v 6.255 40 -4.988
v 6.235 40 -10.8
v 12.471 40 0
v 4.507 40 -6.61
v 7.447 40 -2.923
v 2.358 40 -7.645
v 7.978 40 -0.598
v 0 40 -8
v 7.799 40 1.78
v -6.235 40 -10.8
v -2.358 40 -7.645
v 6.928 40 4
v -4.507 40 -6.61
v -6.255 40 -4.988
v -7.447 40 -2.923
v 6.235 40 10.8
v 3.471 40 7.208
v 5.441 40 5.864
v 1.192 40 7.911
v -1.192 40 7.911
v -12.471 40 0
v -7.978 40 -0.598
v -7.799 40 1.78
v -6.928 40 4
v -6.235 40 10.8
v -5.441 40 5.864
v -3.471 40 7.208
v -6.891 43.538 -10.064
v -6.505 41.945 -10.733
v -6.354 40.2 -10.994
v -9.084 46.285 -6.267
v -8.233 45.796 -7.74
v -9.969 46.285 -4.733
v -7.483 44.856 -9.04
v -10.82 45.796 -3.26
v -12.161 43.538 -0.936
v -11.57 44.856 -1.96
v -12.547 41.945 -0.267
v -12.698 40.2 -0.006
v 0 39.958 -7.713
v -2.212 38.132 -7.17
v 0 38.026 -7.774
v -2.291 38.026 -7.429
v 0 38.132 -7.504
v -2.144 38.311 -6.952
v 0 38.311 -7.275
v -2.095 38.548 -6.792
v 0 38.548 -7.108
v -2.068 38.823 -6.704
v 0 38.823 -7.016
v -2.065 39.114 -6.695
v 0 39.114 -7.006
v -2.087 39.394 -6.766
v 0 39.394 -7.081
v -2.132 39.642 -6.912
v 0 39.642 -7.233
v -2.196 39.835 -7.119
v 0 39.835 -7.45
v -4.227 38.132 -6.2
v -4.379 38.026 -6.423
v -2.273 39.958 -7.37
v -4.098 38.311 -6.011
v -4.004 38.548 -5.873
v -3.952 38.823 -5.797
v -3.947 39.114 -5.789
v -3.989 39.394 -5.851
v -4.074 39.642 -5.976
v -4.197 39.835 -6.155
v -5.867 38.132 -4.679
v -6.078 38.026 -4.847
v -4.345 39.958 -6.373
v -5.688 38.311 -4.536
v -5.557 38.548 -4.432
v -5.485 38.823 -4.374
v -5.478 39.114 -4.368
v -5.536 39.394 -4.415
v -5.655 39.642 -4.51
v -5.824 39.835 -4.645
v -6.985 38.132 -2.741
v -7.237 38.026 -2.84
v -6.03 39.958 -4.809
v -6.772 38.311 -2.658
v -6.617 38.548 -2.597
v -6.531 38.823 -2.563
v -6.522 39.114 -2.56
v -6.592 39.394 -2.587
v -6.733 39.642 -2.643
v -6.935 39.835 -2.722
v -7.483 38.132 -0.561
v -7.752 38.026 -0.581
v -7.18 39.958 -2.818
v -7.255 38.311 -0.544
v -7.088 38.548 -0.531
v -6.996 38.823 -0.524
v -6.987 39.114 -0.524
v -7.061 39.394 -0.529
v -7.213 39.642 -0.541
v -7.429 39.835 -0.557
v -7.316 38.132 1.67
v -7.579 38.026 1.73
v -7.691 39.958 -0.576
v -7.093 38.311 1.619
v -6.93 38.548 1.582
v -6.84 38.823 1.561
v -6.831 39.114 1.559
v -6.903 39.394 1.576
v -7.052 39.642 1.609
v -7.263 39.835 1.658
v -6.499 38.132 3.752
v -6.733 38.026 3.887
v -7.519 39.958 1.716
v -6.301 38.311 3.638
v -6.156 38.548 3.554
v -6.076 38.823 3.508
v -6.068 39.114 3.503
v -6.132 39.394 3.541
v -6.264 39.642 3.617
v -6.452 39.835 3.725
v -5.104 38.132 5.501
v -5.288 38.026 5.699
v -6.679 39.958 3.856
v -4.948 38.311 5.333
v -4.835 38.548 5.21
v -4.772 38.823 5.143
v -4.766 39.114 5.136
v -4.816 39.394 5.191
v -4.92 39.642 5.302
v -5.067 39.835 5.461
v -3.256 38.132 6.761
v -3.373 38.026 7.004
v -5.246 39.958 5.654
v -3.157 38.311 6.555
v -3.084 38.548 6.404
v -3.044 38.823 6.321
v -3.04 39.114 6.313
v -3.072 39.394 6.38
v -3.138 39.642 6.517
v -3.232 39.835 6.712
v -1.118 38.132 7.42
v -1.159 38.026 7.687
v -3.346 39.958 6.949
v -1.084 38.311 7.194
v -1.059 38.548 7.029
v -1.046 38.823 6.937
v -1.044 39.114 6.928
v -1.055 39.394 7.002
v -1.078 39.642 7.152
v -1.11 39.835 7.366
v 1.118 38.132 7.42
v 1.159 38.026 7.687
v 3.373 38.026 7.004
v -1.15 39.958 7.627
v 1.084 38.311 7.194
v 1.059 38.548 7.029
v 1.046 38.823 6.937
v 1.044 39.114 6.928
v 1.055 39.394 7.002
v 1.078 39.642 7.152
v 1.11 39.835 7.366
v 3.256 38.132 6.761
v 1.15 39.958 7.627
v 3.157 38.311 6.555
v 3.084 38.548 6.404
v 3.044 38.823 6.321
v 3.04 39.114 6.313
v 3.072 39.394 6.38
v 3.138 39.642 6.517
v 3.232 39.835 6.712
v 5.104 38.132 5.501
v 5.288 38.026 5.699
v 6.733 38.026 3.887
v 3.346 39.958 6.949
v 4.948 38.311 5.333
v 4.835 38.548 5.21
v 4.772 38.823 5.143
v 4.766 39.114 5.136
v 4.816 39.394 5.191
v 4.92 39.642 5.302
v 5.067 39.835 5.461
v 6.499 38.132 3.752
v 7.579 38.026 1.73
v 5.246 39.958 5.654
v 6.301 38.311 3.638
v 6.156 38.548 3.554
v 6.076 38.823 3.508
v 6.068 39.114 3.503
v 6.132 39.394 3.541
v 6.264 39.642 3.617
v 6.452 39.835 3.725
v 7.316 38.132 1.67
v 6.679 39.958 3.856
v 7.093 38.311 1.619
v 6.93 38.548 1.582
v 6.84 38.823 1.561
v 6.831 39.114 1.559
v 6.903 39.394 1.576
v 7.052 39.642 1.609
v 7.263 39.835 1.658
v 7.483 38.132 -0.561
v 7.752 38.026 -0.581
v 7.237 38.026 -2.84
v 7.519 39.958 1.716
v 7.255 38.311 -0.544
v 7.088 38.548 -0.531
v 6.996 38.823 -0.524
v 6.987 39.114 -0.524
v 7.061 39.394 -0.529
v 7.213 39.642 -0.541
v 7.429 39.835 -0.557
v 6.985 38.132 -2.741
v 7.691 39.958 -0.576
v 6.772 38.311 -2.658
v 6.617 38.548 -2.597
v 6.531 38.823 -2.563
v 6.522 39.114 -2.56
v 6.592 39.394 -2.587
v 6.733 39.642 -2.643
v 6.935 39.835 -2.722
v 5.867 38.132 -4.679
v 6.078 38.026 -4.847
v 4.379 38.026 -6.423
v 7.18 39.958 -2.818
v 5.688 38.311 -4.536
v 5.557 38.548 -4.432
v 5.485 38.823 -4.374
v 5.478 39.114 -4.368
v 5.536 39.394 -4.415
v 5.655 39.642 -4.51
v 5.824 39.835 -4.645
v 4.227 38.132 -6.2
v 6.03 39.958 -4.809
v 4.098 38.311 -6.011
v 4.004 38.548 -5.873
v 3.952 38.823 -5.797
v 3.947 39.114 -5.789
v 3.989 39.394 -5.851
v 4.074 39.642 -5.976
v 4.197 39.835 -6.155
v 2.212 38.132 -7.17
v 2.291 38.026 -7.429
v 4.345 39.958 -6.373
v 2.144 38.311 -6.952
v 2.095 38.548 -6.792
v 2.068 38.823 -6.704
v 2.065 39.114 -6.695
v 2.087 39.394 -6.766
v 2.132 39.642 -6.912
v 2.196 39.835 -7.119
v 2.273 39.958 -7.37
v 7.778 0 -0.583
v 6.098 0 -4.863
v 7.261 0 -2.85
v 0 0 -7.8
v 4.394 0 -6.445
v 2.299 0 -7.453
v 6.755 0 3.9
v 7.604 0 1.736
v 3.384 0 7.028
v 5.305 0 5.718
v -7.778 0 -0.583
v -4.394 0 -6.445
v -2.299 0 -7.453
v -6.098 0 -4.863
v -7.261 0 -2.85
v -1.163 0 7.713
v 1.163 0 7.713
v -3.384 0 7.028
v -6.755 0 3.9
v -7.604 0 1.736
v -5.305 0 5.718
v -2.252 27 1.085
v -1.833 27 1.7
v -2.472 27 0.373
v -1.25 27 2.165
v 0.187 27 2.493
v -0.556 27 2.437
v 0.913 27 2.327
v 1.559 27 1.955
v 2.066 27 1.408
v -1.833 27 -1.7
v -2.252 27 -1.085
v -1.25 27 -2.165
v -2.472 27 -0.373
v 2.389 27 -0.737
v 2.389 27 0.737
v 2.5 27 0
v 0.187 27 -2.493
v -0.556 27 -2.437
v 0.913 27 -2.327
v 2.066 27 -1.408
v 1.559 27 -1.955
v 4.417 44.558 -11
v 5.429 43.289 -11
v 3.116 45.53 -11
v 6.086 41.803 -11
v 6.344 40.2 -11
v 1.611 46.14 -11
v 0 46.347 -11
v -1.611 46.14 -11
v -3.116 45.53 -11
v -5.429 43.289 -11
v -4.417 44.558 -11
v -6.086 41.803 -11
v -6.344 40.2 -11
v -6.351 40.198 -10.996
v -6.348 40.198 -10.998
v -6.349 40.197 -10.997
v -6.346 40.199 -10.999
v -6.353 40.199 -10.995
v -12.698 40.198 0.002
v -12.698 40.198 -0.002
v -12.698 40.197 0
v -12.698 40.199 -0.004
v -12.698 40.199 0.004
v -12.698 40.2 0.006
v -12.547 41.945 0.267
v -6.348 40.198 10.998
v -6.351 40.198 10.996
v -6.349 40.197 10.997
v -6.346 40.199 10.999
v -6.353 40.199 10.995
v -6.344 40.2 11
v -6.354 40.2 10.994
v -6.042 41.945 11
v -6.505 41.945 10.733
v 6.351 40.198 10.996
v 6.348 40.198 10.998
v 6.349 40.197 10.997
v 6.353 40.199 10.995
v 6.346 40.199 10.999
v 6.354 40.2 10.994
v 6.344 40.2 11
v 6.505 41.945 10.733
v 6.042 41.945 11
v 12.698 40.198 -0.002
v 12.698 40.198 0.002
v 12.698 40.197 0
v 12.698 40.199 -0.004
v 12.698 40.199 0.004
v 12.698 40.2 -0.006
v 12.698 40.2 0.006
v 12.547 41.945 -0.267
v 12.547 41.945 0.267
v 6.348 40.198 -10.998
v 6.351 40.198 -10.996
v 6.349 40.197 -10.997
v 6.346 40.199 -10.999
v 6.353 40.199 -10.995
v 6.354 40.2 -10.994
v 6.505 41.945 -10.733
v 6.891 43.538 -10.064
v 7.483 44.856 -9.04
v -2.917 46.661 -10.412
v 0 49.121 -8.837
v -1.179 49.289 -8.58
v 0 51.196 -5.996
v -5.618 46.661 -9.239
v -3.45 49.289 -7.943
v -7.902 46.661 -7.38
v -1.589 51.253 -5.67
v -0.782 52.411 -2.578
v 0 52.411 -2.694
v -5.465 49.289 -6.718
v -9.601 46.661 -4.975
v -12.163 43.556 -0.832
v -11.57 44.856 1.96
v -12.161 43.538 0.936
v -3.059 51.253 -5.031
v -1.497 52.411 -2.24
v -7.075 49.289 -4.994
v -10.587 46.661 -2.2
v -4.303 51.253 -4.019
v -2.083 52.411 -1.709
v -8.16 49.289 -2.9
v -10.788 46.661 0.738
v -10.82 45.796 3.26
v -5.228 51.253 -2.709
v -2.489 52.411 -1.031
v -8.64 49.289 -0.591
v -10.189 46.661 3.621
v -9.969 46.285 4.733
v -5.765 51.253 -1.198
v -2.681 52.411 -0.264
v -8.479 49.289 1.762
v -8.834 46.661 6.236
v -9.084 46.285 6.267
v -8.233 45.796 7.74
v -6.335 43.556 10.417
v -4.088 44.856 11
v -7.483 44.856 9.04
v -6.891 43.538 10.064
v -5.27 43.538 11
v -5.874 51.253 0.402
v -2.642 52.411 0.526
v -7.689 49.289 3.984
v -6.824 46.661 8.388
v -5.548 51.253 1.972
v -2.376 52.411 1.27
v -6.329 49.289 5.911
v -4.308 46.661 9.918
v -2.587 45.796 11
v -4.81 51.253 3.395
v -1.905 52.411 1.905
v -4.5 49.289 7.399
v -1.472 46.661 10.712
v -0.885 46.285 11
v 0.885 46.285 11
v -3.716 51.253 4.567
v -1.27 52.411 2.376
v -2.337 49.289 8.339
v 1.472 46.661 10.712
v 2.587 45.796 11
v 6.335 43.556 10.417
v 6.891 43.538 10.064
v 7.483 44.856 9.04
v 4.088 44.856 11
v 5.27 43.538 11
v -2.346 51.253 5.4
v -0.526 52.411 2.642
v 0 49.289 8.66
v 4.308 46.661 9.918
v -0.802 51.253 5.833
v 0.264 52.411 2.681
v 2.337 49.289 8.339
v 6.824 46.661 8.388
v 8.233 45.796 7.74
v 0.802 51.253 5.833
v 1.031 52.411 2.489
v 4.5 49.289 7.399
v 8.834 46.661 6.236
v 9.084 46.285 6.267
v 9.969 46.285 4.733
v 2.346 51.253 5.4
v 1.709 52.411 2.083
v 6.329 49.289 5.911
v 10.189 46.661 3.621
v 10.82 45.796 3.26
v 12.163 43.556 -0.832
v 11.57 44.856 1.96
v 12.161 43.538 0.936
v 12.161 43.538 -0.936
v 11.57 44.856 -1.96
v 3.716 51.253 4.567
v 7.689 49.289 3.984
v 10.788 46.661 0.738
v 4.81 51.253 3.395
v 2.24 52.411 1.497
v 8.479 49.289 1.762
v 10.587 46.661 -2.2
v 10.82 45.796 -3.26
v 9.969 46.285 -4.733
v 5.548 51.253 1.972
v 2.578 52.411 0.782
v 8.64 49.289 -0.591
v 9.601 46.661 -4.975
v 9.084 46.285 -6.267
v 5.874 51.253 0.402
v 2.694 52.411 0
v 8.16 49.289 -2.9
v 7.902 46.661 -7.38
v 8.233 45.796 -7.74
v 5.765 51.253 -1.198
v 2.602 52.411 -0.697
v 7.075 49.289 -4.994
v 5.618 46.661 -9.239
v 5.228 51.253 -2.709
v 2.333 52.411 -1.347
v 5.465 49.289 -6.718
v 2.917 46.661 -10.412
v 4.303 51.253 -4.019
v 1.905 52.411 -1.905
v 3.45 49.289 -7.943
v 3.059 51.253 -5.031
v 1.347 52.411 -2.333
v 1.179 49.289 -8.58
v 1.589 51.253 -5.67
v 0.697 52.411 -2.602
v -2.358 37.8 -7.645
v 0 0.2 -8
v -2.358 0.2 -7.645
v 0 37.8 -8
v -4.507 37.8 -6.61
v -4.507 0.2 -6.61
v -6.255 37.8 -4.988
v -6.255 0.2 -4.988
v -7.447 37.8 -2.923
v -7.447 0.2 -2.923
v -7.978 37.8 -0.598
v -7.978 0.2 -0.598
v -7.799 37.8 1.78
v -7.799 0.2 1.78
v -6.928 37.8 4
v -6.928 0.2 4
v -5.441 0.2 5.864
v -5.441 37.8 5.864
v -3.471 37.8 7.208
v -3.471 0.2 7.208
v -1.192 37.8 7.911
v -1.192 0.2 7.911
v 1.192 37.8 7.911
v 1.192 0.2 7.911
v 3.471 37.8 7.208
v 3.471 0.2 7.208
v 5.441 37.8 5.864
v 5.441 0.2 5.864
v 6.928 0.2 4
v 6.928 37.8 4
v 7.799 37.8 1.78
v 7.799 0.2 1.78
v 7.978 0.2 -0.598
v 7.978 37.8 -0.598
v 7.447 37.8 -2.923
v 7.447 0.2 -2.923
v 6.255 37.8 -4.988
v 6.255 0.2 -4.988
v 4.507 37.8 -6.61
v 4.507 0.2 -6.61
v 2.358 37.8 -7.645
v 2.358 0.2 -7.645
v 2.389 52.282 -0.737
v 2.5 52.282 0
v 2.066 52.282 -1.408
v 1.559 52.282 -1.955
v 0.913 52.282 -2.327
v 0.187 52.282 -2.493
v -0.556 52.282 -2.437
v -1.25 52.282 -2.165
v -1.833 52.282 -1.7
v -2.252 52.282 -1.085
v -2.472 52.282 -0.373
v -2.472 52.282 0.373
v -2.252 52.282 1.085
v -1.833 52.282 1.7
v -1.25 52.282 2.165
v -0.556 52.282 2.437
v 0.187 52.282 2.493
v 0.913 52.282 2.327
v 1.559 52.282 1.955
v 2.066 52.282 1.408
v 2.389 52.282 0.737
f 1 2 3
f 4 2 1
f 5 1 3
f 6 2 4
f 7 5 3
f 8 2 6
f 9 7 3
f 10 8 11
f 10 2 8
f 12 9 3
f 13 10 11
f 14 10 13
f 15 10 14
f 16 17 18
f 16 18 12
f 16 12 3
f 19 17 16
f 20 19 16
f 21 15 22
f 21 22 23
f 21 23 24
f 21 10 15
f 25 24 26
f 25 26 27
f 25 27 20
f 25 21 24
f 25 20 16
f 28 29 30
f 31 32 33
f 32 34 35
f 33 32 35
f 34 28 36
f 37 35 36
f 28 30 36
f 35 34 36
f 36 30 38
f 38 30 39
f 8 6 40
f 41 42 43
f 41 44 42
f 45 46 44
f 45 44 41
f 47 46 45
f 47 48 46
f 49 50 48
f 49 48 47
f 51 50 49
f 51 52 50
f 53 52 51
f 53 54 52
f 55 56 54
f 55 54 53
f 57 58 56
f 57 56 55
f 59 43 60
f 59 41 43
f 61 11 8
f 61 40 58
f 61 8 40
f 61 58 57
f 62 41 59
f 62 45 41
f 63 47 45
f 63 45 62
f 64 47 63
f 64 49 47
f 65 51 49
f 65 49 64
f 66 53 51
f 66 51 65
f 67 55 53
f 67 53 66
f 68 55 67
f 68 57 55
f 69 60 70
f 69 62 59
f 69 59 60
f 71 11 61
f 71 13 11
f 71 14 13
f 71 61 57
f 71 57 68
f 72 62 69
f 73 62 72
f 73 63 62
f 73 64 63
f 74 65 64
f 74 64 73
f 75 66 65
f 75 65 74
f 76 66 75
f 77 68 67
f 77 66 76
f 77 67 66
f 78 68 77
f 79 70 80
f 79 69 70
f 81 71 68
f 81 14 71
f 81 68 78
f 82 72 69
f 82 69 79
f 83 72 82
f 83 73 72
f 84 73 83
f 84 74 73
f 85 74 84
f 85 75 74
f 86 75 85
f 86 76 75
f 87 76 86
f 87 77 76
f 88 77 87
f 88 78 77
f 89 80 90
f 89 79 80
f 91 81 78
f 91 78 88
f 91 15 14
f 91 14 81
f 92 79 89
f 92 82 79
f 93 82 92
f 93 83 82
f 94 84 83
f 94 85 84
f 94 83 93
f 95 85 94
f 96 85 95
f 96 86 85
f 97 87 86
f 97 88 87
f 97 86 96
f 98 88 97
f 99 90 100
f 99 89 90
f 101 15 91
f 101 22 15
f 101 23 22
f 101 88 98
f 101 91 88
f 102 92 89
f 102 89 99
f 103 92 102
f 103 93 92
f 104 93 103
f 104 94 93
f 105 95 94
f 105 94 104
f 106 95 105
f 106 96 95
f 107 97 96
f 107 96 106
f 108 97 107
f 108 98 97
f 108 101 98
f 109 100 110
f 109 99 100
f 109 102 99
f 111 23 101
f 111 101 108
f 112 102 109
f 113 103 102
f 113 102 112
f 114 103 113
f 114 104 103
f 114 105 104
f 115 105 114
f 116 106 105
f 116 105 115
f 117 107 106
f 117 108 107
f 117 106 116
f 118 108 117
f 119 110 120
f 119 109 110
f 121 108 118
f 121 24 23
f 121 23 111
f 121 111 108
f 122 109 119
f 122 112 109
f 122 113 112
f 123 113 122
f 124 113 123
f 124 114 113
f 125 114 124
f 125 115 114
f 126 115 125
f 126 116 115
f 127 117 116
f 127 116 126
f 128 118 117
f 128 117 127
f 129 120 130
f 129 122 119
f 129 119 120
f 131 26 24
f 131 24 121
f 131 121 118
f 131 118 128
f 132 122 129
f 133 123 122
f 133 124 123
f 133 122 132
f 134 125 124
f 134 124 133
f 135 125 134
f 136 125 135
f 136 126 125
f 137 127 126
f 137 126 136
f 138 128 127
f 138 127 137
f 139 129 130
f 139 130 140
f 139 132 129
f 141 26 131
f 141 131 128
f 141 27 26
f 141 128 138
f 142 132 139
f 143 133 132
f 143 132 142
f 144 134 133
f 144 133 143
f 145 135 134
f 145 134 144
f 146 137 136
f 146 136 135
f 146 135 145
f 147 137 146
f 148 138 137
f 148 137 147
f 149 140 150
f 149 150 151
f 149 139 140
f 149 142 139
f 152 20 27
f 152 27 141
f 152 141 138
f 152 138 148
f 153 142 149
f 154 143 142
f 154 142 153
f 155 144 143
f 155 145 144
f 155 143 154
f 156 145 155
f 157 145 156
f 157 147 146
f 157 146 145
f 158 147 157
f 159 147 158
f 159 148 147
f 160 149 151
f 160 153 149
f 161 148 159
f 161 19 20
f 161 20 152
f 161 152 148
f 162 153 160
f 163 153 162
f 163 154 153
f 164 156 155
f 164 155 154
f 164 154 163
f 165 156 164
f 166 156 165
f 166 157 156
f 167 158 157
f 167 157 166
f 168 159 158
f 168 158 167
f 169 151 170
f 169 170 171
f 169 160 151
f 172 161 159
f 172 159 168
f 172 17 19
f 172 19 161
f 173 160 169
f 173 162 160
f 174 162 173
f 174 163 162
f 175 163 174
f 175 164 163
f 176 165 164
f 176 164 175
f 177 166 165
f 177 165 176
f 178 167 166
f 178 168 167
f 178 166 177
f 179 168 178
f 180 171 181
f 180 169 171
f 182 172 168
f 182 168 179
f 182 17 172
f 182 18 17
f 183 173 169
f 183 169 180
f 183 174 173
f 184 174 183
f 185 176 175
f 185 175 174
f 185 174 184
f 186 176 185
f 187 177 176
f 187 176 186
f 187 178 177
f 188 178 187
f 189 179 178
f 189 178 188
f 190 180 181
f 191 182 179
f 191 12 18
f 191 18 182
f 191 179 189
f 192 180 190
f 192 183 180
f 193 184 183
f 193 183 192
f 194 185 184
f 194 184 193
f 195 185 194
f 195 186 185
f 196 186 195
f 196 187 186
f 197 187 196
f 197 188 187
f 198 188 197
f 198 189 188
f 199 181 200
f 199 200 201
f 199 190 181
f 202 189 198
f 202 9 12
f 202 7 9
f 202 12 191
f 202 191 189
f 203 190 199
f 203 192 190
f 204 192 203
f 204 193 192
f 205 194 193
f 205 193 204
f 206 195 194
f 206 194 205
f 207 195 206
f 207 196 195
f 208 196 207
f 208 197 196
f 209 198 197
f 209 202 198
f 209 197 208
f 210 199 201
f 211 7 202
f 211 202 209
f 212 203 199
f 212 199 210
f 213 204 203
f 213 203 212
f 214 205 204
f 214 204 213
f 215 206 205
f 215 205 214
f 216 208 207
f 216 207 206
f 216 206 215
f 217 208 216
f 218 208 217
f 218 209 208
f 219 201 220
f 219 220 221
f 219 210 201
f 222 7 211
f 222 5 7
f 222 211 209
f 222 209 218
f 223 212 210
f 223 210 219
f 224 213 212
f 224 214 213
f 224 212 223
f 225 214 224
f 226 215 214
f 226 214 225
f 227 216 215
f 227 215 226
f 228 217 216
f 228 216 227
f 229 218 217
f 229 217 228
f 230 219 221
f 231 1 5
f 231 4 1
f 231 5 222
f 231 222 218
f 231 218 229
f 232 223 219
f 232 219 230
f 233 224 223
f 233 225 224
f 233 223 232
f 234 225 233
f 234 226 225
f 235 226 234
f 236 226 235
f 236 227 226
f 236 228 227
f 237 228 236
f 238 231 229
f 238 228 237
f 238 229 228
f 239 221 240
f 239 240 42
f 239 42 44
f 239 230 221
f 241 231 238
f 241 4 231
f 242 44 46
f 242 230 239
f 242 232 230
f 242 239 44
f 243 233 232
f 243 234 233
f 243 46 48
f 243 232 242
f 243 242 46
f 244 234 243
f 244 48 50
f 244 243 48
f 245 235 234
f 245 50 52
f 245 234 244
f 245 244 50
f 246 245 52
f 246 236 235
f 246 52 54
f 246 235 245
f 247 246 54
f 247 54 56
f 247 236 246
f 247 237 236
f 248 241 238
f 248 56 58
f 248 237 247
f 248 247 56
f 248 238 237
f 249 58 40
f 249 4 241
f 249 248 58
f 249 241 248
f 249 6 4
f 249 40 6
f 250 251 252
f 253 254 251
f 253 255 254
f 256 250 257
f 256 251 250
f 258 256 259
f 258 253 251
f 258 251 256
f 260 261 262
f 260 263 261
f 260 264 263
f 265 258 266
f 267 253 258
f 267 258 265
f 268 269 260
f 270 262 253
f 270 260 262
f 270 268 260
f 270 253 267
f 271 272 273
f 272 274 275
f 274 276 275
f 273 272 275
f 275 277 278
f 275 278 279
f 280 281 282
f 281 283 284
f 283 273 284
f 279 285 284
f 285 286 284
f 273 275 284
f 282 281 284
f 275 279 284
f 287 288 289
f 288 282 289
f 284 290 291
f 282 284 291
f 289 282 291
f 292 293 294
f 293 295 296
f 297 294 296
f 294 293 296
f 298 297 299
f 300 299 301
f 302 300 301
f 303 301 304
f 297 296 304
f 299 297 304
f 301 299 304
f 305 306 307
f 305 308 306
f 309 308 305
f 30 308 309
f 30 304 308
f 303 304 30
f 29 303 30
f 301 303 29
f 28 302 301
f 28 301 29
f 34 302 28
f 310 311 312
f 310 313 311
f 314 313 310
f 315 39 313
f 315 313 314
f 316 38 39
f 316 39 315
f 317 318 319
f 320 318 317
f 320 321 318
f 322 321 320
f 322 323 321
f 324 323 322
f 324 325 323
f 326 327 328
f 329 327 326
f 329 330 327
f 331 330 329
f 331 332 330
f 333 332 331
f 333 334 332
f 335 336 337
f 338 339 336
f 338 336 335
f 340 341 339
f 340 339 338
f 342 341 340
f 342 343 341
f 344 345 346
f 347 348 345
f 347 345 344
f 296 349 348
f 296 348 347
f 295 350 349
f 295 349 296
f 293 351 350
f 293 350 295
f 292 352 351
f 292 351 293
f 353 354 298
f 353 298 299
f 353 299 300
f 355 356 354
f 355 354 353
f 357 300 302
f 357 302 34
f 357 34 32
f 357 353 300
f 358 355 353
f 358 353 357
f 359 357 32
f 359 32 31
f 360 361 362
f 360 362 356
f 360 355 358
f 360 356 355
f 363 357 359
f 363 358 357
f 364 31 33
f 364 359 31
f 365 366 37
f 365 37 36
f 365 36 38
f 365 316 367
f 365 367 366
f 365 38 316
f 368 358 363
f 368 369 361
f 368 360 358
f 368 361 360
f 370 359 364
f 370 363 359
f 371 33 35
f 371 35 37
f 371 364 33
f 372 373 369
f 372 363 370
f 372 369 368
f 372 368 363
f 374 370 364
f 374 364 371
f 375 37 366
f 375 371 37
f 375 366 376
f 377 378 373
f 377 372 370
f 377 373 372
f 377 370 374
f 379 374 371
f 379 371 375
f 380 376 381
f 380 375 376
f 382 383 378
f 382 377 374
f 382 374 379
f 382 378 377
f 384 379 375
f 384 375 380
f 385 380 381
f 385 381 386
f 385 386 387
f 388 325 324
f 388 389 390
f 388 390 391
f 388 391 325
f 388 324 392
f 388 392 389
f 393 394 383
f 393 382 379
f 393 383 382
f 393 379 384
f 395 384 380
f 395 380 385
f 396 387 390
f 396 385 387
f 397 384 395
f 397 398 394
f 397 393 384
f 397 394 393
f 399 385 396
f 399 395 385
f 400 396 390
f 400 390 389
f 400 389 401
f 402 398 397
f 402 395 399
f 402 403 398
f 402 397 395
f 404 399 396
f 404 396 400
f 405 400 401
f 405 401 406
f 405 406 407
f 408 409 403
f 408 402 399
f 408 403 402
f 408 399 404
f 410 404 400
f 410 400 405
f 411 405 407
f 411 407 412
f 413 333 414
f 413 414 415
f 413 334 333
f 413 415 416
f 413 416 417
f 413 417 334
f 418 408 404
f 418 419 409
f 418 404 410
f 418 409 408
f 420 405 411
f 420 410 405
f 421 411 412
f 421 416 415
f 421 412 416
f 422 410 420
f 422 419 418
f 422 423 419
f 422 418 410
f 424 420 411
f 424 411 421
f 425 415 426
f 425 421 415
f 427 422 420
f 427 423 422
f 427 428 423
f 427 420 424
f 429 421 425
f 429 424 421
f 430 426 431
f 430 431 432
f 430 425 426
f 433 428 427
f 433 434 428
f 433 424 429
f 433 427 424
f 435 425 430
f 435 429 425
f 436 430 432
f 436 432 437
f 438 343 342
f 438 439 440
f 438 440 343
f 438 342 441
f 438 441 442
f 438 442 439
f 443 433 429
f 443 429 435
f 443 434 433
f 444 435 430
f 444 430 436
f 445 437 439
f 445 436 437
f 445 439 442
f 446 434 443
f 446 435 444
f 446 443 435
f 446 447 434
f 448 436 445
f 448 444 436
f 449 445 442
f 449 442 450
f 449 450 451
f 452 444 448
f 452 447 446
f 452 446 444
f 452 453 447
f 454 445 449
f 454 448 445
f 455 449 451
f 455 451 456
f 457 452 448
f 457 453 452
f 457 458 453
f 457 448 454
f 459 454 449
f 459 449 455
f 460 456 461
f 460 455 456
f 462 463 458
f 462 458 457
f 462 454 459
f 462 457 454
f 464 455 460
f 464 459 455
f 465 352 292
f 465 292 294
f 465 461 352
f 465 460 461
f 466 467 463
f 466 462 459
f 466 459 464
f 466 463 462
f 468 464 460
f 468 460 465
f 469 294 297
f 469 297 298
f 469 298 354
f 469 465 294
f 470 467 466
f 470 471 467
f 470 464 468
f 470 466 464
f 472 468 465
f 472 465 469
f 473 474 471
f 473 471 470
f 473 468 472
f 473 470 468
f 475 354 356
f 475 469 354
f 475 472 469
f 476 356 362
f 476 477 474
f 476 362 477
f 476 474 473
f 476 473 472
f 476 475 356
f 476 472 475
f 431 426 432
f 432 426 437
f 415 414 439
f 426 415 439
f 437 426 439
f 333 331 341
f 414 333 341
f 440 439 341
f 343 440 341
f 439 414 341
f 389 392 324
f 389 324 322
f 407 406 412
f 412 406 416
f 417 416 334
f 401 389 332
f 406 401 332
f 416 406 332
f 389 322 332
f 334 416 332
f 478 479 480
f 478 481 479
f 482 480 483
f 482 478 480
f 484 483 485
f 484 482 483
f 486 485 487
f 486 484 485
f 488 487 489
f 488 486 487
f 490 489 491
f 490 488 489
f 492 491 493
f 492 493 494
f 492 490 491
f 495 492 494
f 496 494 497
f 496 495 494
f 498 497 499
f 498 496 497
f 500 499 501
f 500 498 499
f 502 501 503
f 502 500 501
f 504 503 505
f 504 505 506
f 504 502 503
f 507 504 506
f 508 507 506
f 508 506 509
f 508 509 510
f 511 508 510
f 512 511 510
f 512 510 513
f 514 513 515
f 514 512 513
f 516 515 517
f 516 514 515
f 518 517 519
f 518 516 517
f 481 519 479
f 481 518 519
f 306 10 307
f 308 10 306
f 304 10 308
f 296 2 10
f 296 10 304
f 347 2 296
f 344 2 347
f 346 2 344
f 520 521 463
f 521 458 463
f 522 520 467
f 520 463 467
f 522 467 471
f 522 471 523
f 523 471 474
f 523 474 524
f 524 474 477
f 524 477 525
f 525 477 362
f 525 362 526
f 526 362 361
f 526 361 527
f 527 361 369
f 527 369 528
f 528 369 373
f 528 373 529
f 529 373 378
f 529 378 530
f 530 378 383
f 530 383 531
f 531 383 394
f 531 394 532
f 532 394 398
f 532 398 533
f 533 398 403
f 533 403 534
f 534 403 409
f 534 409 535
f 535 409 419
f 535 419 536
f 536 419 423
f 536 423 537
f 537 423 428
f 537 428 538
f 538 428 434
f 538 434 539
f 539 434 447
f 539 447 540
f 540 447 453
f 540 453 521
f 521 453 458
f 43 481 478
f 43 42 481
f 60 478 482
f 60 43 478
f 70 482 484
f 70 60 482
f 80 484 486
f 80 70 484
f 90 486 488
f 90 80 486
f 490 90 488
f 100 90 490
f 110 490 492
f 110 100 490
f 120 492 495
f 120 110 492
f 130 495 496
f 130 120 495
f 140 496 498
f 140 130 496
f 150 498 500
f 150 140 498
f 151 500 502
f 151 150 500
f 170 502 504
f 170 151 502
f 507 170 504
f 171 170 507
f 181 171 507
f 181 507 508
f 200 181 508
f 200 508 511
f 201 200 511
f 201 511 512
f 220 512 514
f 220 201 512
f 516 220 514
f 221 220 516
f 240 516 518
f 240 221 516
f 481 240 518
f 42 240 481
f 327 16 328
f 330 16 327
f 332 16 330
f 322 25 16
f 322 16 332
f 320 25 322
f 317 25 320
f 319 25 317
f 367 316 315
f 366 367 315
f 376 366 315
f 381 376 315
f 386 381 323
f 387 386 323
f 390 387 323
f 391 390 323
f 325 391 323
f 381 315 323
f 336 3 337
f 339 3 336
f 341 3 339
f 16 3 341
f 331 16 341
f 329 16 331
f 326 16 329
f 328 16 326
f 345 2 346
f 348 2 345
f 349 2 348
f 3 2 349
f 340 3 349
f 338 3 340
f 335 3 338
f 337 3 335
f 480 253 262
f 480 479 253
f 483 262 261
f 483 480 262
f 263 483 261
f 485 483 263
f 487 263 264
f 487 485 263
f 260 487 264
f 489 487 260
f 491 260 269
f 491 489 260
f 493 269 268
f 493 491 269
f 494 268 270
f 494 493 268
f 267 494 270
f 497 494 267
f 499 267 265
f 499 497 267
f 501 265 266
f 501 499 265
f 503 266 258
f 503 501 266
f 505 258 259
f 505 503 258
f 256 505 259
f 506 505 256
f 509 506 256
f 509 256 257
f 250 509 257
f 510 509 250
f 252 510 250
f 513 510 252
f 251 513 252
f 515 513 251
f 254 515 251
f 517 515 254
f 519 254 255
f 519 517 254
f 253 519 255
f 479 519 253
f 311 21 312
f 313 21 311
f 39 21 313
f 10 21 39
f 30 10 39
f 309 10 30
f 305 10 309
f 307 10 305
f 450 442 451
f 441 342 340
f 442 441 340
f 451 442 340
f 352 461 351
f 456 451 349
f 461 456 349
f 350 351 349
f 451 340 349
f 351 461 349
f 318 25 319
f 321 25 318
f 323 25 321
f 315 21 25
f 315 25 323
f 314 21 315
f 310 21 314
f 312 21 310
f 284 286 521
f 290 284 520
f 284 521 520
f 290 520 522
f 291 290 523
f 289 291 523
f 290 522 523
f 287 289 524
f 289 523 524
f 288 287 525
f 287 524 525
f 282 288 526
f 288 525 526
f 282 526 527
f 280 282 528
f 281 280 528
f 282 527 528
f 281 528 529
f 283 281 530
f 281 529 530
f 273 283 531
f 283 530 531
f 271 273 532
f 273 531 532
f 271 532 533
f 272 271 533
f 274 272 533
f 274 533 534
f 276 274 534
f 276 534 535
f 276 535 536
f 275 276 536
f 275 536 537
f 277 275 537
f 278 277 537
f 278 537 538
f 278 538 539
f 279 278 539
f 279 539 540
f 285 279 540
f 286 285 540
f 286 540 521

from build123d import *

# Parameters (mm, degrees)
SKETCH2_R             = 19.260759025
CUT_EXTRUDE1_DEPTH    = 50
M6X1_0_TAPPED_HOLE1_D = 5
CHAMFER1_SIZE         = 0.2
CHAMFER1_SIZE_2       = 0.169882553
BOSS_EXTRUDE1_START   = -27
SKETCH6_R             = 2.5
BOSS_EXTRUDE1_DEPTH   = 27


with BuildPart() as part:
    # Sketch3 → Revolve1 (revolve)
    with BuildSketch(Plane.XY, mode=Mode.PRIVATE) as revolve1_sk:
        with BuildLine():
            Line((0, 0), (8, 0))
            Line((8, 0), (8, 38))
            ThreePointArc((8, 38), (7, 39), (8, 40))
            Line((8, 40), (12.7, 40))
            ThreePointArc((12.7, 40), (8.980256121, 48.980256121), (0, 52.7))
            Line((0, 52.7), (0, 0))
        make_face()
    revolve(revolve1_sk.sketch.rotate(Axis((0, 0, 0), (0, 1, 0)), 90), axis=Axis((0, 0, 0), (0, 1, 0)))

    # Sketch2 → Cut-Extrude1 (cut)
    with BuildSketch(Plane(origin=(0, 0, 0), x_dir=(1, 0, 0), z_dir=(0, 1, 0))):
        Circle(SKETCH2_R)
        Polygon((-6.350852961, 11), (-12.701705922, 0), (-6.350852961, -11), (6.350852961, -11), (12.701705922, 0), (6.350852961, 11), align=None, mode=Mode.SUBTRACT)
    extrude(amount=CUT_EXTRUDE1_DEPTH, mode=Mode.SUBTRACT)

    # M6x1.0 Tapped Hole1 (through all)
    with Locations(Plane(origin=(0, 0, 0), x_dir=(-1, 0, 0), z_dir=(0, -1, 0))):
        with Locations((0, 0)):
            Hole(M6X1_0_TAPPED_HOLE1_D / 2)

    # Chamfer1
    # the kernel refuses this chamfer: 0.2, 0.169882553 mm, written as the material it takes off along each edge
    with BuildSketch(Plane(origin=(12.957167955, 40, 0.44247322), x_dir=(-0.8660254037844386, 0, 0.5), z_dir=(-0.5000000000000001, 0, -0.8660254037844387)), Plane(origin=(6.095390928, 40, 11.44247322), x_dir=(-0.8660254037844386, 0, -0.5), z_dir=(0.5000000000000001, 0, -0.8660254037844386)), Plane(origin=(-6.861777027, 40, 11), x_dir=(0, 0, -1), z_dir=(1, 0, 0)), Plane(origin=(-12.957167955, 40, -0.44247322), x_dir=(0.8660254037844387, 0, -0.5), z_dir=(0.5, 0, 0.8660254037844387)), Plane(origin=(-6.095390928, 40, -11.44247322), x_dir=(0.8660254037844384, 0, 0.5000000000000002), z_dir=(-0.5000000000000003, 0, 0.8660254037844386)), Plane(origin=(6.861777027, 40, -11), x_dir=(0, 0, 1), z_dir=(-1, 0, 0))) as chamfer1_piece_1:
        Polygon((CHAMFER1_SIZE, 0), (0, CHAMFER1_SIZE), (0, 0), align=None)
    extrude(amount=13.723554053, mode=Mode.SUBTRACT)
    with BuildSketch(Plane(origin=(0, 38, 0), x_dir=(0, 0, -1), z_dir=(1, 0, 0))) as chamfer1_piece_2:
        with BuildLine():
            Line((8, -CHAMFER1_SIZE), (7.774165739, 0.025834261))
            ThreePointArc((7.774165739, 0.025834261), (7.883207603, 0.00684365), (8, 0))
            Line((8, 0), (8, -CHAMFER1_SIZE))
        make_face()
    revolve(axis=Axis((0, 38, 0), (0, 1, 0)), mode=Mode.SUBTRACT)
    with BuildSketch(Plane(origin=(0, 0, 0), x_dir=(0, 0, -1), z_dir=(1, 0, 0))) as chamfer1_piece_3:
        Polygon((8 - CHAMFER1_SIZE, 0), (8, CHAMFER1_SIZE), (8, 0), align=None)
    revolve(axis=Axis((0, 0, 0), (0, 1, 0)), mode=Mode.SUBTRACT)
    with BuildSketch(Plane(origin=(0, 52.451505933, 0), x_dir=(1, 0, 0), z_dir=(0, 0, 1))) as chamfer1_piece_4:
        with BuildLine():
            Line((2.5, -CHAMFER1_SIZE_2), (2.694261242, -0.040585082))
            ThreePointArc((2.694261242, -0.040585082), (2.599956234, -0.020487166), (2.5, 0))
            Line((2.5, 0), (2.5, -CHAMFER1_SIZE_2))
        make_face()
    revolve(axis=Axis((0, 52.451505933, 0), (0, 1, 0)), revolution_arc=90, mode=Mode.SUBTRACT)
    with BuildSketch(Plane(origin=(0, 52.451505933, 0), x_dir=(0, 0, -1), z_dir=(1, 0, 0))) as chamfer1_piece_5:
        with BuildLine():
            Line((2.5, -CHAMFER1_SIZE_2), (2.694261242, -0.040585082))
            ThreePointArc((2.694261242, -0.040585082), (2.599956234, -0.020487166), (2.5, 0))
            Line((2.5, 0), (2.5, -CHAMFER1_SIZE_2))
        make_face()
    revolve(axis=Axis((0, 52.451505933, 0), (0, 1, 0)), revolution_arc=270, mode=Mode.SUBTRACT)

    # Sketch6 → Boss-Extrude1 (add)
    with BuildSketch(Plane.XZ.offset(BOSS_EXTRUDE1_START)):
        with Locations(Location((0, 0, 0), (0, 0, 270))):
            Circle(SKETCH6_R)
    extrude(amount=BOSS_EXTRUDE1_DEPTH)


solid = part.part
